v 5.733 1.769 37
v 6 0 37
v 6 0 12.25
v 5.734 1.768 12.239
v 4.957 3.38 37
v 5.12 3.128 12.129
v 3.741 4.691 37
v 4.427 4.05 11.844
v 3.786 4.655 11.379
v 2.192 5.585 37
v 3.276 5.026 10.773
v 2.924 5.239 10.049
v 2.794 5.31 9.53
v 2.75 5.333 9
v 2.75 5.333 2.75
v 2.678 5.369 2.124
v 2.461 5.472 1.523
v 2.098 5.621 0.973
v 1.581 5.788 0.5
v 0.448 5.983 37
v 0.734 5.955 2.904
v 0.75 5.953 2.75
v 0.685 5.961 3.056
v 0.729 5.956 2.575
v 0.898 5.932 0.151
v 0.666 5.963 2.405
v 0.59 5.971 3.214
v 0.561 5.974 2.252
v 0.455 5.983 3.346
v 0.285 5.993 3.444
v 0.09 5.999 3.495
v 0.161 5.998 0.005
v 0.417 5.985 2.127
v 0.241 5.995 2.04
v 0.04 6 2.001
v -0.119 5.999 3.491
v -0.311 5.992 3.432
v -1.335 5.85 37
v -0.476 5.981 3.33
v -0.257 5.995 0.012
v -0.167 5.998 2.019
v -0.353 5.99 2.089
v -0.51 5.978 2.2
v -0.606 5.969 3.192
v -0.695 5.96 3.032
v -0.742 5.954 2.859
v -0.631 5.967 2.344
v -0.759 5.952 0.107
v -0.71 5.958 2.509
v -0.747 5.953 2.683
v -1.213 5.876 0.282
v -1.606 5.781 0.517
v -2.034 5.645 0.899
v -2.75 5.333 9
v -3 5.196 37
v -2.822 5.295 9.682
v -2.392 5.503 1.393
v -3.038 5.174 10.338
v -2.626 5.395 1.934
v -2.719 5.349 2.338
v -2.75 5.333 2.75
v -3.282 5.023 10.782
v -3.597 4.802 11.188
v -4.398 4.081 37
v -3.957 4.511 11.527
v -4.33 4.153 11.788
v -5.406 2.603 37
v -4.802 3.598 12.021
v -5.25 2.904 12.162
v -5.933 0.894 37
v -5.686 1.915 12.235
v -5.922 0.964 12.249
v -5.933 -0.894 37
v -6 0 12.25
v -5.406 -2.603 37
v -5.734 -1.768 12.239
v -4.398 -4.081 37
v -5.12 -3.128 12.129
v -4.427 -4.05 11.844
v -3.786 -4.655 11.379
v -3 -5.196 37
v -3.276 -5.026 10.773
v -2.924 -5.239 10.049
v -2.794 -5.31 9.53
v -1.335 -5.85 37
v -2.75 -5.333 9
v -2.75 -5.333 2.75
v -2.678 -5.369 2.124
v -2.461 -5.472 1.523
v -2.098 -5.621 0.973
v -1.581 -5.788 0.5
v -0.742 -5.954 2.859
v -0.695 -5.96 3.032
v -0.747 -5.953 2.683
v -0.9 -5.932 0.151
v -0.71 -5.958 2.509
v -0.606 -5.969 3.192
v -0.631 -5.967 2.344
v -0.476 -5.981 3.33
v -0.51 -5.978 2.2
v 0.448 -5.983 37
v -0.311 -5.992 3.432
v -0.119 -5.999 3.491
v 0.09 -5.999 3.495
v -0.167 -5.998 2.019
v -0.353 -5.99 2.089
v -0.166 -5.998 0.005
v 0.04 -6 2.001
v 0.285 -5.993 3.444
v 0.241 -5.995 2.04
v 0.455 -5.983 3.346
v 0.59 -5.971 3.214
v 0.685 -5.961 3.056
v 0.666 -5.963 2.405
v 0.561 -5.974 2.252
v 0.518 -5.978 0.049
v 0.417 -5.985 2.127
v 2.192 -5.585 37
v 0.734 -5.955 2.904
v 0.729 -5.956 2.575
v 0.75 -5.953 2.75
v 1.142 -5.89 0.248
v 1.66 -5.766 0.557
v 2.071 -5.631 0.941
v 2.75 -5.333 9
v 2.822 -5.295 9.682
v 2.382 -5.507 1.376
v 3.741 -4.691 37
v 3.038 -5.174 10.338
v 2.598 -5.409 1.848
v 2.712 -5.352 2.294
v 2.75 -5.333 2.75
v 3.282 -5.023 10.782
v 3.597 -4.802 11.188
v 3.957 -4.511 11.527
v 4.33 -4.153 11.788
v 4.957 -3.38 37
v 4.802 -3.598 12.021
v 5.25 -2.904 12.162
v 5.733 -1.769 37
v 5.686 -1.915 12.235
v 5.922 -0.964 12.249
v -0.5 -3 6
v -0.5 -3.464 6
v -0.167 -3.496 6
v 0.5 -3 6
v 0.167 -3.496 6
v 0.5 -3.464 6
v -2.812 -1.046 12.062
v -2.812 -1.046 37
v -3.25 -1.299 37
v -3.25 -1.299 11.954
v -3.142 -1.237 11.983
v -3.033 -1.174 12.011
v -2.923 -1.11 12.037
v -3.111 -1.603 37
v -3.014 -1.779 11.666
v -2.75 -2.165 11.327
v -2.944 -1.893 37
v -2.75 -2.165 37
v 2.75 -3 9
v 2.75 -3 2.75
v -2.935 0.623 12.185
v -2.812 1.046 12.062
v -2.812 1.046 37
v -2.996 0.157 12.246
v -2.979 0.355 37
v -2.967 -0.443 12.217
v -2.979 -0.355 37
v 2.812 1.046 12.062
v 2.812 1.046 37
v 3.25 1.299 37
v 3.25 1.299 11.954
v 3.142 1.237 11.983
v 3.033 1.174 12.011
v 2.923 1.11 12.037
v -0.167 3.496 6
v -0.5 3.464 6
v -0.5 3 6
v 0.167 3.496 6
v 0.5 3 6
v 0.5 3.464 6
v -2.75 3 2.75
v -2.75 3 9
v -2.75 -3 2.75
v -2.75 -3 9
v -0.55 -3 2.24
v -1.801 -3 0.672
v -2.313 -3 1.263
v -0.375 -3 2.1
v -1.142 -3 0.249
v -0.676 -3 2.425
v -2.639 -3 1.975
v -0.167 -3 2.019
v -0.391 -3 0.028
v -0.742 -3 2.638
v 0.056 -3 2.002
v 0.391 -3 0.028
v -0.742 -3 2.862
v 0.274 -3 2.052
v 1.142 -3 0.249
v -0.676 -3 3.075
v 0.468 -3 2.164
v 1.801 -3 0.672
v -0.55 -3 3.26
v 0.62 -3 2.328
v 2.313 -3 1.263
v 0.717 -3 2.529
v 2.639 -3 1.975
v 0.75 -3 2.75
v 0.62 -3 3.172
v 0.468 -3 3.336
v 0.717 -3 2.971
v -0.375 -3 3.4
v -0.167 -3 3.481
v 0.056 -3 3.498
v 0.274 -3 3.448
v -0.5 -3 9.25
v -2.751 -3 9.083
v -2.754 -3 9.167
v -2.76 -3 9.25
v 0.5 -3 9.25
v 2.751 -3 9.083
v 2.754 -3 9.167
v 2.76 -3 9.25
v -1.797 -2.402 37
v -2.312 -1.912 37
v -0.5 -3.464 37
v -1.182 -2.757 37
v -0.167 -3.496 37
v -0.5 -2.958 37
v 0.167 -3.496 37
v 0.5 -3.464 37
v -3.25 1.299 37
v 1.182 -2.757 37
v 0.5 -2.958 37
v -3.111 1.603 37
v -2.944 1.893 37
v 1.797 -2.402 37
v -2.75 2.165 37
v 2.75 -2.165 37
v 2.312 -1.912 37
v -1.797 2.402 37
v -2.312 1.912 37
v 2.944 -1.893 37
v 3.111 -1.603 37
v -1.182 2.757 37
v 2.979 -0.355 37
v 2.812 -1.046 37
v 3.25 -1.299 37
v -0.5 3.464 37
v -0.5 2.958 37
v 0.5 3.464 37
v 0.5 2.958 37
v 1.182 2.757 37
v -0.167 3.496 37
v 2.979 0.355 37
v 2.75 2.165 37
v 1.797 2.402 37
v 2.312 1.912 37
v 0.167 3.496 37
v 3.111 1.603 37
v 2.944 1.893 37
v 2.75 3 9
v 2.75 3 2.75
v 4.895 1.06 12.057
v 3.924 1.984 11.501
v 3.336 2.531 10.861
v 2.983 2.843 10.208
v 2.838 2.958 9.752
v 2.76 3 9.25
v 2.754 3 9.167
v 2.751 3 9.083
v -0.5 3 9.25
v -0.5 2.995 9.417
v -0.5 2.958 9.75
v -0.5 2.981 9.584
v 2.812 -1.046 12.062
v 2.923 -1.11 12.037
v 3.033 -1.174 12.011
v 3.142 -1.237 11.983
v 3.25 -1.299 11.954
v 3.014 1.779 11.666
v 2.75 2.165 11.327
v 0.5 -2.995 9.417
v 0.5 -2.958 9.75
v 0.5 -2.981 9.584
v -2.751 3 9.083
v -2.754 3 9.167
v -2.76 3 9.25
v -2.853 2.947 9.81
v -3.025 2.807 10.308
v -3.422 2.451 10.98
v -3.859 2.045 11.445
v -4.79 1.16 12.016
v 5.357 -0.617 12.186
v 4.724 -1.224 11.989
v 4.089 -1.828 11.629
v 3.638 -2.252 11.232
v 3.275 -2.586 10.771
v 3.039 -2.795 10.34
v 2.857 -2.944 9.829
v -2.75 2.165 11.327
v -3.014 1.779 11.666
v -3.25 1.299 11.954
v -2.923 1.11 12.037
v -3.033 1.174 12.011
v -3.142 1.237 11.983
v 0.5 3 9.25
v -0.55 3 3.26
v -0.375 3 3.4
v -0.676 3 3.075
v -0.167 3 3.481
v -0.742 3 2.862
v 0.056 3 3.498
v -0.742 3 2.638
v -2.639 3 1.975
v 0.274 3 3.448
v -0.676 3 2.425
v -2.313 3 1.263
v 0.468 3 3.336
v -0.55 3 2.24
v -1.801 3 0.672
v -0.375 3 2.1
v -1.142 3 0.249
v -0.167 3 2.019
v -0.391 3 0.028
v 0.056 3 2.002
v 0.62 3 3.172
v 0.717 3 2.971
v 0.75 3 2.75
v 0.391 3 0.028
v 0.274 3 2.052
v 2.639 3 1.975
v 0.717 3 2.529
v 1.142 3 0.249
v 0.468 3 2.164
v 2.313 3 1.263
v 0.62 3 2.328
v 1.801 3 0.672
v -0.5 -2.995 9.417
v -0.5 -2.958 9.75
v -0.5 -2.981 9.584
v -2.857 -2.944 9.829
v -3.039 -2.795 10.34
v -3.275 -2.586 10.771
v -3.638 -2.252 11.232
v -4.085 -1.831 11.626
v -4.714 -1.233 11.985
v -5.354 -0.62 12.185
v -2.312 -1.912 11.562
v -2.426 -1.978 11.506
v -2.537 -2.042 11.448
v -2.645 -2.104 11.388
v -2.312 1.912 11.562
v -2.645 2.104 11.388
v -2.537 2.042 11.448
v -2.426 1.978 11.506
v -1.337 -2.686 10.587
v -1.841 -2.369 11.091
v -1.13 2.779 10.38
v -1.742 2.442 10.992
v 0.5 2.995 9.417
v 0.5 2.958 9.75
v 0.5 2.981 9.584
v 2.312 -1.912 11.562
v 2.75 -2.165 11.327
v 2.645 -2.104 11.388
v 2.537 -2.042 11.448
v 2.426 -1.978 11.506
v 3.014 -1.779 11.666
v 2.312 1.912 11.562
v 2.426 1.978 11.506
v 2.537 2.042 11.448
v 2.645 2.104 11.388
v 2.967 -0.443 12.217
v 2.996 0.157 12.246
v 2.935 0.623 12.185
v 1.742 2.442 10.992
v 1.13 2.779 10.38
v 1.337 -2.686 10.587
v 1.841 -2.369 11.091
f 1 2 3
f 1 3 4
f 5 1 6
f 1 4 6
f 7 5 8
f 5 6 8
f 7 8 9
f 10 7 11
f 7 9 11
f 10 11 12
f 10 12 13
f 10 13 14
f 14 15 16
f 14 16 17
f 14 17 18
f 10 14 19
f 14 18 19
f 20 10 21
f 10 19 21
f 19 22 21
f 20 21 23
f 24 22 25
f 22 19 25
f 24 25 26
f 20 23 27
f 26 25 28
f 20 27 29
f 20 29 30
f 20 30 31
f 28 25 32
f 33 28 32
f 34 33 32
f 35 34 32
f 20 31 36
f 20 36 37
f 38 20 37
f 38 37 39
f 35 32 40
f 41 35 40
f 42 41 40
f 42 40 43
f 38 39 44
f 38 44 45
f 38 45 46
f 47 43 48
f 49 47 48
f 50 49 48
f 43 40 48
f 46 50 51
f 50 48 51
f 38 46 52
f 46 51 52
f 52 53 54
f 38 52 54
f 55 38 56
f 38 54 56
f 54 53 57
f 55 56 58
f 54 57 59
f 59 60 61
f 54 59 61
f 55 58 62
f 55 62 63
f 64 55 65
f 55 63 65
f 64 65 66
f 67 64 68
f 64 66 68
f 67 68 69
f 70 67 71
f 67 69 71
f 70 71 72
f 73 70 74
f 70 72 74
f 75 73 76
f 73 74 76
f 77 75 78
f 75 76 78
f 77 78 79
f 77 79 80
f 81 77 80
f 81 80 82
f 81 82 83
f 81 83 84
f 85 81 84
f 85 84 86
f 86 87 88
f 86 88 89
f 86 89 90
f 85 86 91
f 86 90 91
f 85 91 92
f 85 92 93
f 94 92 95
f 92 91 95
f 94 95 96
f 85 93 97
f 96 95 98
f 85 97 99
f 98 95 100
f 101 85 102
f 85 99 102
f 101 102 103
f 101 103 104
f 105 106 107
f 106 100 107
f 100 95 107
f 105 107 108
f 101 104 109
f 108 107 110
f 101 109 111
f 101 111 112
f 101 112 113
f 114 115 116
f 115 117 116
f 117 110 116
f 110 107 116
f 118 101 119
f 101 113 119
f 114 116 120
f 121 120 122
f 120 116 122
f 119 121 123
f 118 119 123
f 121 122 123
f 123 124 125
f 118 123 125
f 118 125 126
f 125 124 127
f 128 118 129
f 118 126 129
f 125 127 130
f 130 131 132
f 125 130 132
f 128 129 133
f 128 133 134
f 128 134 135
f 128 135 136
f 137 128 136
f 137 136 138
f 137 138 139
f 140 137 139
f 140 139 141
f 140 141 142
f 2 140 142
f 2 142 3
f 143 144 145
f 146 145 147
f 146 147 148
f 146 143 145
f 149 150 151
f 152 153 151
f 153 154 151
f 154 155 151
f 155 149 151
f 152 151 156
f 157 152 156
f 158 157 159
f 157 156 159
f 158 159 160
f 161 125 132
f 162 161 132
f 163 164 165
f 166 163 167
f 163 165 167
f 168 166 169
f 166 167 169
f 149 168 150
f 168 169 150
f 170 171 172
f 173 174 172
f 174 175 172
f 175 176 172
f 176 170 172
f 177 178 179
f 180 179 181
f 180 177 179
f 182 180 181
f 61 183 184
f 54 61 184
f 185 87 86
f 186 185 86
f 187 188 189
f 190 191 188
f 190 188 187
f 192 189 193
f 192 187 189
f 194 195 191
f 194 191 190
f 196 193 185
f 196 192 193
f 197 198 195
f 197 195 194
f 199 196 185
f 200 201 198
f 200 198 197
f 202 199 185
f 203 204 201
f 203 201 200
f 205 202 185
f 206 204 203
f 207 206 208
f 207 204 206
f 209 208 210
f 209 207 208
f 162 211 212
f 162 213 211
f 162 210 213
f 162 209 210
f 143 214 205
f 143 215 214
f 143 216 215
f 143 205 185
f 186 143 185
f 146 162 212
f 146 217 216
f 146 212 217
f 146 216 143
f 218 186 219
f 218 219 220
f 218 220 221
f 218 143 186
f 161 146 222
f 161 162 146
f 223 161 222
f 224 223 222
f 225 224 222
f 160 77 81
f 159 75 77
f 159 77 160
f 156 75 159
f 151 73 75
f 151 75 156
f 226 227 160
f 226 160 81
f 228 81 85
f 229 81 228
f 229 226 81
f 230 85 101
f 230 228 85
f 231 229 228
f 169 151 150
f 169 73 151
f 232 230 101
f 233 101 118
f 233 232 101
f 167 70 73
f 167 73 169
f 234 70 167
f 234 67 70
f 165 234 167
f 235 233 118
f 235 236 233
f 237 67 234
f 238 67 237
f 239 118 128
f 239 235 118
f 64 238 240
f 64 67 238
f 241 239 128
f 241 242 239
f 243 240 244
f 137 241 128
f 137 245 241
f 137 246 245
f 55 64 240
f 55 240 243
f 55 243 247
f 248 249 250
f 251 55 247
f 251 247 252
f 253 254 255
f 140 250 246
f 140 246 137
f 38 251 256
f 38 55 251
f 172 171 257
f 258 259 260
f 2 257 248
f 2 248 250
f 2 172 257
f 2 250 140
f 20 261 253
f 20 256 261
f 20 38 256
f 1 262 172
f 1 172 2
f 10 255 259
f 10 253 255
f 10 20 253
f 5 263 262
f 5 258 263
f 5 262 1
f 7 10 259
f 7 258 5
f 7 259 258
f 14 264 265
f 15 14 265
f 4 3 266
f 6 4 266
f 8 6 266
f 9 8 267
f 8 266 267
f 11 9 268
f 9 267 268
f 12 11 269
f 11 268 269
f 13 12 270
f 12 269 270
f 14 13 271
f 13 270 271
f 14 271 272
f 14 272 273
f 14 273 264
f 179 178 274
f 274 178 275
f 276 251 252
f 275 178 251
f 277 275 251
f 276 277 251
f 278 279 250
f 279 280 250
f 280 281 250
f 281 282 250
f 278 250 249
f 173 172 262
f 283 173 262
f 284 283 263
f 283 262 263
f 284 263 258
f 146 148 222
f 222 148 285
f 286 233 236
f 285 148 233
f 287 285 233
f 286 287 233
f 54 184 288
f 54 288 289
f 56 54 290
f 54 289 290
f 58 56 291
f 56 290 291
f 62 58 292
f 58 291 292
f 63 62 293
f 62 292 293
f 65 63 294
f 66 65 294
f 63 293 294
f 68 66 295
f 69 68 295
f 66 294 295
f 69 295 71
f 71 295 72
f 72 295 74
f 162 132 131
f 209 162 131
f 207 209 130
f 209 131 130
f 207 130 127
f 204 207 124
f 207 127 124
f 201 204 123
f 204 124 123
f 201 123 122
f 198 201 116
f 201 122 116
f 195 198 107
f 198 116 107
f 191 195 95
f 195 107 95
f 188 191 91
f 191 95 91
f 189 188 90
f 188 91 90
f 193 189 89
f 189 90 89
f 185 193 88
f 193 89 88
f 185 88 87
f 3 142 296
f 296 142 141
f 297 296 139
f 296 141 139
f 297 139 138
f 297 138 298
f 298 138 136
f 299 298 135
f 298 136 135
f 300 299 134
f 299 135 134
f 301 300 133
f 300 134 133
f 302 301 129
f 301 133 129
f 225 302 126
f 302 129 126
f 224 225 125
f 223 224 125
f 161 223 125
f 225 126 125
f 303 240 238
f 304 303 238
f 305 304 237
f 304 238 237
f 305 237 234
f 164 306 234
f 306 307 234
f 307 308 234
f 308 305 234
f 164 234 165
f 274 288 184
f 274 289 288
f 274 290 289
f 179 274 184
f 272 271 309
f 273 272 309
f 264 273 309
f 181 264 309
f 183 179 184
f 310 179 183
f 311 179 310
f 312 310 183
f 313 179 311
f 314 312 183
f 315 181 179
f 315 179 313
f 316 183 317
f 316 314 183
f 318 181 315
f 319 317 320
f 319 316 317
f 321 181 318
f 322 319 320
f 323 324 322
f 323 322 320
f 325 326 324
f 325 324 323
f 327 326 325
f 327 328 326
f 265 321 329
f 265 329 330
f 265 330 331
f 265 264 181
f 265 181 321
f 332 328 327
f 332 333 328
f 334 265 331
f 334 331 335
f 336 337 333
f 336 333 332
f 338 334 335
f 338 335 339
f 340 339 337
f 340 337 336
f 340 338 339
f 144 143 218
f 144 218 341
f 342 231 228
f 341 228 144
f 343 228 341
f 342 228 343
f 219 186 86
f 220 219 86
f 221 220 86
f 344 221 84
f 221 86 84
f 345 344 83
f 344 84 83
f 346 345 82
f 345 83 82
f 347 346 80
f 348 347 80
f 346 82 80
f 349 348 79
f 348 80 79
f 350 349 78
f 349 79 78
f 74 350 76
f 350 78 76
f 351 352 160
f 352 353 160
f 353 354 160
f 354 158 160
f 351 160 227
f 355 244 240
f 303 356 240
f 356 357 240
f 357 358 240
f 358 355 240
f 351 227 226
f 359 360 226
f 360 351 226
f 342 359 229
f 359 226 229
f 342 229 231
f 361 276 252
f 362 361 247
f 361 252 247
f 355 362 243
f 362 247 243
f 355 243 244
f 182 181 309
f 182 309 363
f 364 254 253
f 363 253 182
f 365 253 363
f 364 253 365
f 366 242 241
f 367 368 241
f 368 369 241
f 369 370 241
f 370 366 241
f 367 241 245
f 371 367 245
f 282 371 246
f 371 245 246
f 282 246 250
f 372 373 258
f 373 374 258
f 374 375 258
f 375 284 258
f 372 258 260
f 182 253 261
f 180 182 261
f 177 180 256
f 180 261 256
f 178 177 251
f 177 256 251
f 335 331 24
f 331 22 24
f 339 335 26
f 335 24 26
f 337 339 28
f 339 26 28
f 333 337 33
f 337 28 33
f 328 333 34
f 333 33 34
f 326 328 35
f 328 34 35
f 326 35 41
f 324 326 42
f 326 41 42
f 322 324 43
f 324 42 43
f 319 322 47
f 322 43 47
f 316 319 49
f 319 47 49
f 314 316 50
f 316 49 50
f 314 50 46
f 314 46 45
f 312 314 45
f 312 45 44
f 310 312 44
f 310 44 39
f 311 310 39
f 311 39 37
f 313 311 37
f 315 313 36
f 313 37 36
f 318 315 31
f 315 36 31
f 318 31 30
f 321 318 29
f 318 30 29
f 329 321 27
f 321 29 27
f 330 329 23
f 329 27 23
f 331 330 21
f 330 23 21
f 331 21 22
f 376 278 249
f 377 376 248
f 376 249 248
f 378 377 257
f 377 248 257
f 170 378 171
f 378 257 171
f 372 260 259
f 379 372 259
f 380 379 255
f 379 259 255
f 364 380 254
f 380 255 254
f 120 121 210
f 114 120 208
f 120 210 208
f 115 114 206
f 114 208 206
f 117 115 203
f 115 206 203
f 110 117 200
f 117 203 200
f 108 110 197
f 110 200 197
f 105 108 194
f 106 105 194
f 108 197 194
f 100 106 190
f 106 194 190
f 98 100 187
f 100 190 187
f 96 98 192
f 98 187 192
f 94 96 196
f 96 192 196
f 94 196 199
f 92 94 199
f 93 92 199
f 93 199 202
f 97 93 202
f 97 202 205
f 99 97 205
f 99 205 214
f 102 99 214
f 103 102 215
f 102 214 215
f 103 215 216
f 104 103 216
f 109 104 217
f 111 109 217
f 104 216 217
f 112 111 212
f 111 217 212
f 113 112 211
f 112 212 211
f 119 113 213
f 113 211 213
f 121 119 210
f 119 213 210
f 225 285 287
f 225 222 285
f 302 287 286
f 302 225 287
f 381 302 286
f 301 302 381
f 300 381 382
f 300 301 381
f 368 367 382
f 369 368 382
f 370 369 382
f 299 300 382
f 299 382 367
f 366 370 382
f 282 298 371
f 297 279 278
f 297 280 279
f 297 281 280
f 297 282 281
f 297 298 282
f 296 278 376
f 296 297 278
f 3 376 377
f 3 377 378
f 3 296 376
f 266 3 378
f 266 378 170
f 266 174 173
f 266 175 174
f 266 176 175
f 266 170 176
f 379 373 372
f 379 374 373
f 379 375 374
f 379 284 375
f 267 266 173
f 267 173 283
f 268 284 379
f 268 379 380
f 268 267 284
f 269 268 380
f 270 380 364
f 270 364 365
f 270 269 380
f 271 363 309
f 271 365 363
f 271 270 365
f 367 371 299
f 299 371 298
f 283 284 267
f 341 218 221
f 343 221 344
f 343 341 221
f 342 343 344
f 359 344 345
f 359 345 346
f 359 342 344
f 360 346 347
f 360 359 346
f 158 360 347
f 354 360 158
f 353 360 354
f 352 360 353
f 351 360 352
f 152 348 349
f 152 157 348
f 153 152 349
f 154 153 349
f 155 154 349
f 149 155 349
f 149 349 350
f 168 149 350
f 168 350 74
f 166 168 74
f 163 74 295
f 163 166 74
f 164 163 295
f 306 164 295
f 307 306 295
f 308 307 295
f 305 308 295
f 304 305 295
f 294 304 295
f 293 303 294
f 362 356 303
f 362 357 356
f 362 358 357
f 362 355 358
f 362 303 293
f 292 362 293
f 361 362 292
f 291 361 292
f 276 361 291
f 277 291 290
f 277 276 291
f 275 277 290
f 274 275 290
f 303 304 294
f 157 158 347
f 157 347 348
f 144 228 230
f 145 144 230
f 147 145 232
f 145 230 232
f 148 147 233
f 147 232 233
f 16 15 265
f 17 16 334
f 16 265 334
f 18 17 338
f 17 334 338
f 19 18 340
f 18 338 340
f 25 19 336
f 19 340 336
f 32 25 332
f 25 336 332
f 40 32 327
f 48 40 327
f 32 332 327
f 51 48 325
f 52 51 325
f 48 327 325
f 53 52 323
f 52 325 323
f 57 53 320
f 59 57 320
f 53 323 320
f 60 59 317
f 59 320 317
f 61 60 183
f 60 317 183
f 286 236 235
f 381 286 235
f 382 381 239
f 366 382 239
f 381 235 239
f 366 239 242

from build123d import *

# Parameters (mm, degrees)
SKETCH_1_R          = 6
SKETCH_1_R_2        = 2.5
EXTRUDE_1_DEPTH     = 37
SKETCH_2_OUTSIDE_W  = 22.142
SKETCH_2_OUTSIDE_H  = 47.142
SKETCH_2_OUTSIDE_R  = 0.75
CUT_EXTRUDE_1_DEPTH = 9.5
CUT_EXTRUDE_2_DEPTH = 9.5
CUT_EXTRUDE_3_DEPTH = 31


with BuildPart() as part:
    # 草图1 → 凸台-拉伸1 (new body)
    with BuildSketch(Plane.XY):
        Circle(SKETCH_1_R)
        Circle(SKETCH_1_R_2, mode=Mode.SUBTRACT)
    extrude(amount=EXTRUDE_1_DEPTH)

    # 草图2 outside → 切除-拉伸1 (cut, symmetric)
    with BuildSketch(Plane(origin=(0, 0, 0), x_dir=(1, 0, 0), z_dir=(0, 1, 0))):
        with Locations((0, -18.5)):
            Rectangle(SKETCH_2_OUTSIDE_W, SKETCH_2_OUTSIDE_H)
        with BuildLine():
            Line((-2.75, -2.75), (-2.75, -9))
            ThreePointArc((-2.75, -9), (-3.701902961, -11.298097039), (-6, -12.25))
            Line((-6, -12.25), (-6, -37))
            Line((-6, -37), (6, -37))
            Line((6, -37), (6, -12.25))
            ThreePointArc((6, -12.25), (3.701902961, -11.298097039), (2.75, -9))
            Line((2.75, -9), (2.75, -2.75))
            ThreePointArc((2.75, -2.75), (0, 0), (-2.75, -2.75))
        make_face(mode=Mode.SUBTRACT)
        with Locations((0, -2.75)):
            Circle(SKETCH_2_OUTSIDE_R)
    extrude(amount=CUT_EXTRUDE_1_DEPTH, both=True, mode=Mode.SUBTRACT)

    # 草图3 → 切除-拉伸2 (cut, symmetric)
    with BuildSketch(Plane(origin=(0, 0, 0), x_dir=(0, 0, -1), z_dir=(1, 0, 0))):
        with BuildLine():
            Line((-9.250000001, 3), (0.966464558, 3))
            Line((0.966464558, 3), (0.966464558, -3))
            Line((0.966464558, -3), (-9.250000001, -3))
            ThreePointArc((-9.250000001, -3), (-12.250000001, 0), (-9.250000001, 3))
        make_face()
    extrude(amount=CUT_EXTRUDE_2_DEPTH, both=True, mode=Mode.SUBTRACT)

    # 草图4 → 切除-拉伸3 (cut)
    with BuildSketch(Plane.XY.offset(37)):
        with BuildLine():
            Line((-0.5, 3.464101615), (-0.5, 2.958039892))
            ThreePointArc((-0.5, 2.958039892), (-1.5, 2.598076211), (-2.311737691, 1.912032648))
            Line((-2.311737691, 1.912032648), (-2.75, 2.165063509))
            ThreePointArc((-2.75, 2.165063509), (-3.031088913, 1.75), (-3.25, 1.299038106))
            Line((-3.25, 1.299038106), (-2.811737691, 1.046007244))
            ThreePointArc((-2.811737691, 1.046007244), (-3, 0), (-2.811737691, -1.046007244))
            Line((-2.811737691, -1.046007244), (-3.25, -1.299038106))
            ThreePointArc((-3.25, -1.299038106), (-3.031088913, -1.75), (-2.75, -2.165063509))
            Line((-2.75, -2.165063509), (-2.311737691, -1.912032648))
            ThreePointArc((-2.311737691, -1.912032648), (-1.5, -2.598076211), (-0.5, -2.958039892))
            Line((-0.5, -2.958039892), (-0.5, -3.464101615))
            ThreePointArc((-0.5, -3.464101615), (0, -3.5), (0.5, -3.464101615))
            Line((0.5, -3.464101615), (0.5, -2.958039892))
            ThreePointArc((0.5, -2.958039892), (1.5, -2.598076211), (2.311737691, -1.912032648))
            Line((2.311737691, -1.912032648), (2.75, -2.165063509))
            ThreePointArc((2.75, -2.165063509), (3.031088913, -1.75), (3.25, -1.299038106))
            Line((3.25, -1.299038106), (2.811737691, -1.046007244))
            ThreePointArc((2.811737691, -1.046007244), (3, 0), (2.811737691, 1.046007244))
            Line((2.811737691, 1.046007244), (3.25, 1.299038106))
            ThreePointArc((3.25, 1.299038106), (3.031088913, 1.75), (2.75, 2.165063509))
            Line((2.75, 2.165063509), (2.311737691, 1.912032648))
            ThreePointArc((2.311737691, 1.912032648), (1.5, 2.598076211), (0.5, 2.958039892))
            Line((0.5, 2.958039892), (0.5, 3.464101615))
            ThreePointArc((0.5, 3.464101615), (0, 3.5), (-0.5, 3.464101615))
        make_face()
    extrude(amount=-CUT_EXTRUDE_3_DEPTH, mode=Mode.SUBTRACT)


solid = part.part
